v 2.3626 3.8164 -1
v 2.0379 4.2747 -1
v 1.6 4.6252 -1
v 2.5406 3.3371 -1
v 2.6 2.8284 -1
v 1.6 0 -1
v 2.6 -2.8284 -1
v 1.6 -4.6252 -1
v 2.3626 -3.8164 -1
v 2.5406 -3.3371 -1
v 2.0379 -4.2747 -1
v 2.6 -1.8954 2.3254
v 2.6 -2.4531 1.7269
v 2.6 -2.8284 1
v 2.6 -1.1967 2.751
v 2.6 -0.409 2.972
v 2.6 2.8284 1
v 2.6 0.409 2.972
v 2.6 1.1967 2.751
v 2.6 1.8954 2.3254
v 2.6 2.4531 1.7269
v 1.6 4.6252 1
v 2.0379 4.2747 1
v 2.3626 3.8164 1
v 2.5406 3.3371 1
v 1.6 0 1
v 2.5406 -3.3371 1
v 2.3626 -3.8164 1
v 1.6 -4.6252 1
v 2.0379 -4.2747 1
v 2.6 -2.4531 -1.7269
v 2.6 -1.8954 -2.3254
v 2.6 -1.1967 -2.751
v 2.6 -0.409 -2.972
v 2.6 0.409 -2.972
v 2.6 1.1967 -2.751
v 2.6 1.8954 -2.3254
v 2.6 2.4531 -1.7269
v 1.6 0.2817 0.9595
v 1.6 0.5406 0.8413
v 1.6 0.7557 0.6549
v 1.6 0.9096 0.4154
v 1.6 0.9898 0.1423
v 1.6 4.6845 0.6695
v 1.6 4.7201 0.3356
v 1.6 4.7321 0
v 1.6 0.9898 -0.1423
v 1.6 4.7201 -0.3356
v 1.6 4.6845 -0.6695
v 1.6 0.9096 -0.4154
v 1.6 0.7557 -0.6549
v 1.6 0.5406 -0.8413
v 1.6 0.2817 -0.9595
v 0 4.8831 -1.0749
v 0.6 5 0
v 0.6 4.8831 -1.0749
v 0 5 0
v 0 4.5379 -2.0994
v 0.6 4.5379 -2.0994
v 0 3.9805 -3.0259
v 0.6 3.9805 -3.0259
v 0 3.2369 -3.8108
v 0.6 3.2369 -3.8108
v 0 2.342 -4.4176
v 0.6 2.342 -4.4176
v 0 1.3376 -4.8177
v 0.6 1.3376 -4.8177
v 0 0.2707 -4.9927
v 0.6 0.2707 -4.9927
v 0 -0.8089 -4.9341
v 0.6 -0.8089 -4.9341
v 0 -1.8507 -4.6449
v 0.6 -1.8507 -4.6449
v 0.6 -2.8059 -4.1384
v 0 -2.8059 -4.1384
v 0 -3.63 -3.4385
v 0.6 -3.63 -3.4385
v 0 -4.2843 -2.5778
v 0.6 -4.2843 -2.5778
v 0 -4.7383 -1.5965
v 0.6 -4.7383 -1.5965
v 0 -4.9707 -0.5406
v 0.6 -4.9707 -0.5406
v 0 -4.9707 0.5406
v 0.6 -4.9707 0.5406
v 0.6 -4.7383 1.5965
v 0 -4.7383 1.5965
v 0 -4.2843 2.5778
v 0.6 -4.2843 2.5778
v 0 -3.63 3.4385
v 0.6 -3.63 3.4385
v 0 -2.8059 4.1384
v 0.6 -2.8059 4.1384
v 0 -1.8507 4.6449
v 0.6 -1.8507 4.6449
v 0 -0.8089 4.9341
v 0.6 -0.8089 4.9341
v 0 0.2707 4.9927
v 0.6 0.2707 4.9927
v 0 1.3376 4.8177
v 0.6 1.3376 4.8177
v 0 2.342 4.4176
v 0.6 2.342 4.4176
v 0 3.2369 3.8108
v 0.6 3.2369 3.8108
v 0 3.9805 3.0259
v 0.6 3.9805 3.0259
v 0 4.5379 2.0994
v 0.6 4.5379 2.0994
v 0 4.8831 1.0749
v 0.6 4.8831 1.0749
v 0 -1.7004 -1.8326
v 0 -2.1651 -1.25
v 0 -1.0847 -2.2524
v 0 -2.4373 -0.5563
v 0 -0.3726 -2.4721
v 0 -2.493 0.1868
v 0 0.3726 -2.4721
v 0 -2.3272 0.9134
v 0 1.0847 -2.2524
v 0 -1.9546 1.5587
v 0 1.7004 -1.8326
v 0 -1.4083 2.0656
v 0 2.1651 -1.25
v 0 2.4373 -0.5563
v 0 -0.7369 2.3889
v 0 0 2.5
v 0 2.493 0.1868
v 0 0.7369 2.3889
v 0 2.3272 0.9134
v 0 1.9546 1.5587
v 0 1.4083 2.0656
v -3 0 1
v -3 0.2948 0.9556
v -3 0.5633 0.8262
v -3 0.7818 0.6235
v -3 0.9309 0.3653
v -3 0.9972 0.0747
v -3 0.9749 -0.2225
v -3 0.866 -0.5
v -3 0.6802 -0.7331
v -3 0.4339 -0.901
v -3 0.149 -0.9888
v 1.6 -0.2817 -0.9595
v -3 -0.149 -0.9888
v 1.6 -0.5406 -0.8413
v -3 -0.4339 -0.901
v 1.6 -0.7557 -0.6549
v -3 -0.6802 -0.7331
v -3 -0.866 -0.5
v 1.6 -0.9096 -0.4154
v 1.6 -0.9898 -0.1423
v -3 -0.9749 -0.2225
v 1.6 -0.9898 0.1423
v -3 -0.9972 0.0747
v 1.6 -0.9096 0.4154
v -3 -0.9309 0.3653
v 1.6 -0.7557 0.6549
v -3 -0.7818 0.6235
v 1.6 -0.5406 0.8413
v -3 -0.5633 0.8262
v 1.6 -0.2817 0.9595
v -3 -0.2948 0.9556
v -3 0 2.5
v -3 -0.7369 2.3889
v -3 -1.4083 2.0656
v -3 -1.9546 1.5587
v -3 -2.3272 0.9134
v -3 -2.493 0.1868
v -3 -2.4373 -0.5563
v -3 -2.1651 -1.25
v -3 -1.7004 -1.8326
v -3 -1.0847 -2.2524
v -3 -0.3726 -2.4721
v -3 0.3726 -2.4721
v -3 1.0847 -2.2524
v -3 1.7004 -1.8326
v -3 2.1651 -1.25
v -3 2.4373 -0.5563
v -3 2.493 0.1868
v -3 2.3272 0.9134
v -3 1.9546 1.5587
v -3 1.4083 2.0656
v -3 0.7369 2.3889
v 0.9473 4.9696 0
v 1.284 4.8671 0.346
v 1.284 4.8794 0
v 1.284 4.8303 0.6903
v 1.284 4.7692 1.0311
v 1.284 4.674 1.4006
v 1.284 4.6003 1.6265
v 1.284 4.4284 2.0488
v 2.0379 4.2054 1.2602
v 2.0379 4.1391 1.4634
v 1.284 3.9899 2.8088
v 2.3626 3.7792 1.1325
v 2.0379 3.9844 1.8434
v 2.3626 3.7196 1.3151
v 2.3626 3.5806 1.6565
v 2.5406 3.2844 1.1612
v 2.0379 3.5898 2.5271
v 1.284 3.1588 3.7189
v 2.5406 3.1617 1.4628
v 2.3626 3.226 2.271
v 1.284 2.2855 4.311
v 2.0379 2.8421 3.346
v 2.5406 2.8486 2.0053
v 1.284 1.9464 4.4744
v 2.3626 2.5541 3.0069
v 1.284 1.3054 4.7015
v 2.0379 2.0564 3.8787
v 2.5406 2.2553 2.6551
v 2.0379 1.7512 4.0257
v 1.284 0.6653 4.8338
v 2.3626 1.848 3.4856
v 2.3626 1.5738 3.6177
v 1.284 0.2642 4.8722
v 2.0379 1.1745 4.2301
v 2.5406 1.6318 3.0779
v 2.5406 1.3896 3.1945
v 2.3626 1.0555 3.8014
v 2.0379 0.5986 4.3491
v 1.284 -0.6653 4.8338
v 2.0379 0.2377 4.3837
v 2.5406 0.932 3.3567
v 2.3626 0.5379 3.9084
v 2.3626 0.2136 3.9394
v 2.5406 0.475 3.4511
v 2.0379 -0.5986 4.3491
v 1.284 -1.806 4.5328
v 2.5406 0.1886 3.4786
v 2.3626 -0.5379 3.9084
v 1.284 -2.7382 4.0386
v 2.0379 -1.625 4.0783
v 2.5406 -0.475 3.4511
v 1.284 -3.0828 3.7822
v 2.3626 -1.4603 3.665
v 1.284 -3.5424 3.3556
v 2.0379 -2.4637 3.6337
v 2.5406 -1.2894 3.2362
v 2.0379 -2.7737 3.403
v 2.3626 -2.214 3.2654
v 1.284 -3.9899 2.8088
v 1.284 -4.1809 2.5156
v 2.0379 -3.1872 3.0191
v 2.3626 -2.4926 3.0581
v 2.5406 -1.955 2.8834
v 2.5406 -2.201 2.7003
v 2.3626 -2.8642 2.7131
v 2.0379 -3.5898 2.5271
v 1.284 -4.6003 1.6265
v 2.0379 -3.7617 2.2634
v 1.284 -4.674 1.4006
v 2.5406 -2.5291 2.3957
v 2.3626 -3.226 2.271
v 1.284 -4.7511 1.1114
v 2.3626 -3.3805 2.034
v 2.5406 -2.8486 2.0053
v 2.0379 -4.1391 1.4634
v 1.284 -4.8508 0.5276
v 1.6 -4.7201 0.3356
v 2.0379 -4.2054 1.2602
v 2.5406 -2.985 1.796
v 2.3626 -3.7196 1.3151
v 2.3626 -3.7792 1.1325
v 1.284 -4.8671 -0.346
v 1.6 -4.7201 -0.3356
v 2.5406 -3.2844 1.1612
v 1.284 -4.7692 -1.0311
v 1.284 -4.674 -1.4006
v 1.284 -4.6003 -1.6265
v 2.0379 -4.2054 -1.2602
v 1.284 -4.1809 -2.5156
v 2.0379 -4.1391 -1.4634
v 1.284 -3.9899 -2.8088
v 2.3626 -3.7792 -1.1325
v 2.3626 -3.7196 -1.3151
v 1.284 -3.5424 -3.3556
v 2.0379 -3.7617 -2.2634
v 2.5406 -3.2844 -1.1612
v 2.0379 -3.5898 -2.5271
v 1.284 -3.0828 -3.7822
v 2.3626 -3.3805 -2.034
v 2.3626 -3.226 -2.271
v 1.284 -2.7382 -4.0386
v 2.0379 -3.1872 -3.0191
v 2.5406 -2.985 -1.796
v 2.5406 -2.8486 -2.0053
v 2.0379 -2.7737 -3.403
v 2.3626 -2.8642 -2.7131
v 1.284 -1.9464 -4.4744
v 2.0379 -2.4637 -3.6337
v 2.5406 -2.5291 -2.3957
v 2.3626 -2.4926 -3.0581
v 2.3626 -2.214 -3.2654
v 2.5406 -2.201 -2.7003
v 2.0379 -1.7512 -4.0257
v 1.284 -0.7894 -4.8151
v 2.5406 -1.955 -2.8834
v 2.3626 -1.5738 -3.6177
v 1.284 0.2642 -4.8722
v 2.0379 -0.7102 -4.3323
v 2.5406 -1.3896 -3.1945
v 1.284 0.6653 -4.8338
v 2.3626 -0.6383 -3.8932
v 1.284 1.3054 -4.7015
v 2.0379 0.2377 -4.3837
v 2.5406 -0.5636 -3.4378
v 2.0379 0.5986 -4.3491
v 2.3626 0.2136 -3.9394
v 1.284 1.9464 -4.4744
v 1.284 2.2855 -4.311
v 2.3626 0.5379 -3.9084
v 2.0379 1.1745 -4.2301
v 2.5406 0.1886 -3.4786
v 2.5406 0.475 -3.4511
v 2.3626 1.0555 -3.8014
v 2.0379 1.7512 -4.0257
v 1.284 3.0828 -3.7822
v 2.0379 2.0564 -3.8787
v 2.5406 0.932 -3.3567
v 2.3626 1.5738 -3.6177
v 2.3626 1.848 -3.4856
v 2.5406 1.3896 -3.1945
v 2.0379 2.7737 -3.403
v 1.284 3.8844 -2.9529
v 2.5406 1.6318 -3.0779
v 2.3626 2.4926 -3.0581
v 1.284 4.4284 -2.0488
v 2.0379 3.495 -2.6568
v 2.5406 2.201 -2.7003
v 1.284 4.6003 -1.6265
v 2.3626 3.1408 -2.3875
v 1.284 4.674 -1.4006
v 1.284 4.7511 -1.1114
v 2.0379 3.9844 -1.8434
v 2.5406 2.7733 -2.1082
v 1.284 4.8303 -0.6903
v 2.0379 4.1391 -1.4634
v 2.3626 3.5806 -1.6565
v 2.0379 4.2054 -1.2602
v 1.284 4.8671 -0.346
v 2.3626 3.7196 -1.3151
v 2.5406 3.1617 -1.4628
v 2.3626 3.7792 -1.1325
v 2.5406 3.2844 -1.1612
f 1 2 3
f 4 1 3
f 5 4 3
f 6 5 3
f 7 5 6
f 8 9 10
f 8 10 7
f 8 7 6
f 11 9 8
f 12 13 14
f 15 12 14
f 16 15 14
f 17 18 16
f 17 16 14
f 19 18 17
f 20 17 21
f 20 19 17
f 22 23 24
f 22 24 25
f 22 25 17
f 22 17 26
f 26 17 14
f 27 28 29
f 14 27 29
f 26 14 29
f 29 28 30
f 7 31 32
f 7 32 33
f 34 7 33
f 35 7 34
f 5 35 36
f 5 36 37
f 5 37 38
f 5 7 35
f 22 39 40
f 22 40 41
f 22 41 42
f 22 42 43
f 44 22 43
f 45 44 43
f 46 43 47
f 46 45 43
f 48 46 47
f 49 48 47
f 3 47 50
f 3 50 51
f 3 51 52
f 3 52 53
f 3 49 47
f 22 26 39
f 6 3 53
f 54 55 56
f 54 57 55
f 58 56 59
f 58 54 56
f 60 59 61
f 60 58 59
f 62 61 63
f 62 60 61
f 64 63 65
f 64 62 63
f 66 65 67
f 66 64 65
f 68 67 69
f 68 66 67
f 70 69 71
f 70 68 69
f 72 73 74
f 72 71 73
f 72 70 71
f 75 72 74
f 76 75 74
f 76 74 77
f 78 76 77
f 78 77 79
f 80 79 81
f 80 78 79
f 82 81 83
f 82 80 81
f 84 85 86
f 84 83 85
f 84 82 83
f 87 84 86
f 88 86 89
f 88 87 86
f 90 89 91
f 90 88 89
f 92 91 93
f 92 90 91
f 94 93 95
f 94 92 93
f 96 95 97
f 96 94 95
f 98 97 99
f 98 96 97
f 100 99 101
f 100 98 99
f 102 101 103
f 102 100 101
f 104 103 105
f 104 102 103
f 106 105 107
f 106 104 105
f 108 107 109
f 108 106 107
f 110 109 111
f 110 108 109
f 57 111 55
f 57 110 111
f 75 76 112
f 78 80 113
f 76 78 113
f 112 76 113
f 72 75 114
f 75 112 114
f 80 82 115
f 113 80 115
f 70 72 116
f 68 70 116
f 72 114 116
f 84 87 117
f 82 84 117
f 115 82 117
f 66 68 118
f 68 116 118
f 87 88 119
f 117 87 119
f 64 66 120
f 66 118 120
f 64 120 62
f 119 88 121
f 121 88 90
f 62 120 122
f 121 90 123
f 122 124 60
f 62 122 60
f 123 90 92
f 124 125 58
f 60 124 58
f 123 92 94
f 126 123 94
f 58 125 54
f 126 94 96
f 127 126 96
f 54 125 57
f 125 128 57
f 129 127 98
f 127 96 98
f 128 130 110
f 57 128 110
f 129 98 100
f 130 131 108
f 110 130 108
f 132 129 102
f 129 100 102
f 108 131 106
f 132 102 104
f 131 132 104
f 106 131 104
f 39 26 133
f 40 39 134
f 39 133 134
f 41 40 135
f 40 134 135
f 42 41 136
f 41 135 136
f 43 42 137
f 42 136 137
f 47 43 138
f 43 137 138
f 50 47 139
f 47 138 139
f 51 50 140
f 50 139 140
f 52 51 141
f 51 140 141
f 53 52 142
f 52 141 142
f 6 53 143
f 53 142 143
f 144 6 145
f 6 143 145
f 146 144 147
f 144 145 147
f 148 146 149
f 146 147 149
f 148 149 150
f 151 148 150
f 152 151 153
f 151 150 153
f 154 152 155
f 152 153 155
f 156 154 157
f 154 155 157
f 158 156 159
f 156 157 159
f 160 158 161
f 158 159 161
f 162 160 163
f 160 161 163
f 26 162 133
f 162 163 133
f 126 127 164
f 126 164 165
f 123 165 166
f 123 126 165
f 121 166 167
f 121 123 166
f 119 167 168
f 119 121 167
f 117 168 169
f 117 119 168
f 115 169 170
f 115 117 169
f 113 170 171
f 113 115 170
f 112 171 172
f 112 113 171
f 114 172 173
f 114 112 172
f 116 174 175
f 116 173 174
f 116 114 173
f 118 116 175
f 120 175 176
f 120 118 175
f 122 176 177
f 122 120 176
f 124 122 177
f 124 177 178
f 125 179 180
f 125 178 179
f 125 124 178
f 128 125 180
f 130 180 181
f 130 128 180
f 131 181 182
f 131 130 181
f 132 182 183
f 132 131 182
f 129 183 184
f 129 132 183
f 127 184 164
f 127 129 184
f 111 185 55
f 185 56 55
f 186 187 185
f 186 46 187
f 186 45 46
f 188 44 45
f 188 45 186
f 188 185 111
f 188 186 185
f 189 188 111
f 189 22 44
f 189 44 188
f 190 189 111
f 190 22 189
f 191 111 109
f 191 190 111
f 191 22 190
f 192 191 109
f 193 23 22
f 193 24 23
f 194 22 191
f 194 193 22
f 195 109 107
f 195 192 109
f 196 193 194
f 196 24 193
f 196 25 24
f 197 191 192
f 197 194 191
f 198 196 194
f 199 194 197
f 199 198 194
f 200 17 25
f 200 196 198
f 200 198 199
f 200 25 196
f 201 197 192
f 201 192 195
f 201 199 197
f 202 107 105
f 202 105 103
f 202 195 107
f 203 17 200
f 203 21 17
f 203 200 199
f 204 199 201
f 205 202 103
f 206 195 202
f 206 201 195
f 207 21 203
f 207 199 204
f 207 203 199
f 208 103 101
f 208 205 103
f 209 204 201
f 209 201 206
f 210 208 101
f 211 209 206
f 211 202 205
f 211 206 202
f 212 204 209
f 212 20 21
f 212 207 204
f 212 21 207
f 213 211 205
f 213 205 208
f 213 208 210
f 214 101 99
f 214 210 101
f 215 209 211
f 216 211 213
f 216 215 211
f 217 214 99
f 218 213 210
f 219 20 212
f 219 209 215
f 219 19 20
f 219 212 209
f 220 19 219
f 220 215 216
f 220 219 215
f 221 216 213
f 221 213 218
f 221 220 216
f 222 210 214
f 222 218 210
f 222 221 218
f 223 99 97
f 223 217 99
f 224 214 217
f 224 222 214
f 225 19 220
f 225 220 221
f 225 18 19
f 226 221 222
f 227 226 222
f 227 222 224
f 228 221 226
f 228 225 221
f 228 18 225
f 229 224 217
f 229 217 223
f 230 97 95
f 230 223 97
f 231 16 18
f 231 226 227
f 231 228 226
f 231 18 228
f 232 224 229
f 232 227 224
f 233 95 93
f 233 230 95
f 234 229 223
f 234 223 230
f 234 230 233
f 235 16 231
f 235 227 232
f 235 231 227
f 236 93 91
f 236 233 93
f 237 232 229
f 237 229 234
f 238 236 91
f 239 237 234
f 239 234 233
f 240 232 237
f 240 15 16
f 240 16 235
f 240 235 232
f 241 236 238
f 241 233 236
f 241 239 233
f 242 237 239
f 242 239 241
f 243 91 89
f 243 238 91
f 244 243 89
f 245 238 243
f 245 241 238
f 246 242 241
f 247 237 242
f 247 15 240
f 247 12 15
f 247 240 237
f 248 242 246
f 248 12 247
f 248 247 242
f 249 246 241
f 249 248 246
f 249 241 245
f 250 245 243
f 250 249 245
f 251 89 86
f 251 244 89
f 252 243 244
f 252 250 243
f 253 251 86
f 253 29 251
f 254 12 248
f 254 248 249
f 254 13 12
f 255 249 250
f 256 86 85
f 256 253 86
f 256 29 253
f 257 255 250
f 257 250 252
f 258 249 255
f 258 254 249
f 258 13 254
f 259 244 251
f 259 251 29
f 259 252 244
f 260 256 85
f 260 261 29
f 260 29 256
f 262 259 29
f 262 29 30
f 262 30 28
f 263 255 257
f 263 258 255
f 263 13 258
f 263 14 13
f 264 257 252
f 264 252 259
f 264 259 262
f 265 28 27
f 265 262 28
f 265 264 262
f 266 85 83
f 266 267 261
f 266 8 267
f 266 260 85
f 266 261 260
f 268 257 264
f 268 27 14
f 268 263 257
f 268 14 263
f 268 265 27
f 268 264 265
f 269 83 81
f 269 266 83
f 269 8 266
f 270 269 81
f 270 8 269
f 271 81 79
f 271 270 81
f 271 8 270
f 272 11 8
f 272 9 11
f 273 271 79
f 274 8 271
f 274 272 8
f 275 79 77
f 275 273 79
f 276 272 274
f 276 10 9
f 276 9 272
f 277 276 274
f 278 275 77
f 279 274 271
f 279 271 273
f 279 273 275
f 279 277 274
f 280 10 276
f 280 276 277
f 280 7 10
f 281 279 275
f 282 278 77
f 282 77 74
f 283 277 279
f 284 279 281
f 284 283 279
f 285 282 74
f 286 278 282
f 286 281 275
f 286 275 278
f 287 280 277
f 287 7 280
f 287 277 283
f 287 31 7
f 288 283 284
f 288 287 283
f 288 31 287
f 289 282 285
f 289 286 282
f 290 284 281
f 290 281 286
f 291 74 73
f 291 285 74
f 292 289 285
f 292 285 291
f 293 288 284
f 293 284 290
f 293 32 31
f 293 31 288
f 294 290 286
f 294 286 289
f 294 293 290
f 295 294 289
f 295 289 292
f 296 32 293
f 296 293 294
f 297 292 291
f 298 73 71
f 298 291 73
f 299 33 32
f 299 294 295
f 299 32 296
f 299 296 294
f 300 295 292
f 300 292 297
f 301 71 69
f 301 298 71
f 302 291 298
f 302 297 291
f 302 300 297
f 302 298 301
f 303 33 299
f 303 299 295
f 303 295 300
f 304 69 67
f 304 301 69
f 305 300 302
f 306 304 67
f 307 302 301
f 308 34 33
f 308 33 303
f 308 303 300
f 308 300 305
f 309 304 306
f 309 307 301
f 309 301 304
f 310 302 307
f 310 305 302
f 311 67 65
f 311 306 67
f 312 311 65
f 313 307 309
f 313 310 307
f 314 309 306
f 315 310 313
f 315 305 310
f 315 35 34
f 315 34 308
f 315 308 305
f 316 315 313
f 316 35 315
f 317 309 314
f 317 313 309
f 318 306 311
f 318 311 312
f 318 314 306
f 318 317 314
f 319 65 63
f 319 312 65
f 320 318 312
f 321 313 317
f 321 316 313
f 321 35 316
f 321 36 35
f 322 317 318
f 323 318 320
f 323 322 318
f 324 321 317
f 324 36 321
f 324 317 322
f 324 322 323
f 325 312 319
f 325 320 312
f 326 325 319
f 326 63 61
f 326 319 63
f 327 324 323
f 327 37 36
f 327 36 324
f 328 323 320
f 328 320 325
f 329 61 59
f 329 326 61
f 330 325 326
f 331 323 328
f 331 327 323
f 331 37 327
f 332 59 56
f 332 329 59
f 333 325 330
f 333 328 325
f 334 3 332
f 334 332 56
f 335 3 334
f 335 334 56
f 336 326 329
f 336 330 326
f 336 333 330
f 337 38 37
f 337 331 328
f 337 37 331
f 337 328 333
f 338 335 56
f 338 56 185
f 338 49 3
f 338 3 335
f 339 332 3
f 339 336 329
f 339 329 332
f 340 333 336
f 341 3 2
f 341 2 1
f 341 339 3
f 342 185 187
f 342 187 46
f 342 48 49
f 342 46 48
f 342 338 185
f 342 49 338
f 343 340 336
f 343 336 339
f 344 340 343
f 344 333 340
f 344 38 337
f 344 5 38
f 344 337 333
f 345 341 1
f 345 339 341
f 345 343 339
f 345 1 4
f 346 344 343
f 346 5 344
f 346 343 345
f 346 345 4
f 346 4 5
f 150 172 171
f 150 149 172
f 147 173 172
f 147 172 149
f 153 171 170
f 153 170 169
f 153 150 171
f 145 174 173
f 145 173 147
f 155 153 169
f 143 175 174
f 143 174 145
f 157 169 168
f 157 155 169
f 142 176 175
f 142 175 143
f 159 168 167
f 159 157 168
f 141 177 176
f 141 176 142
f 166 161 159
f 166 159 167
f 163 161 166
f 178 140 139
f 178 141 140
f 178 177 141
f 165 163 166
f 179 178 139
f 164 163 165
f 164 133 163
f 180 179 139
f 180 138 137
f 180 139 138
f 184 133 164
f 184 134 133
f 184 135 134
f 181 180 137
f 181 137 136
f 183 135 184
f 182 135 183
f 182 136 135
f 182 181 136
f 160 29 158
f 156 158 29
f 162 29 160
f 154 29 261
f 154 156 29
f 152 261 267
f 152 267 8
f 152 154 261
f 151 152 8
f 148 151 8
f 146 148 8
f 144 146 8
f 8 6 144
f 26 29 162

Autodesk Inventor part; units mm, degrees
ref_plane "YZ Plane" through (0, 0, 0) normal (1, 0, 0) x (0, 1, 0)
ref_plane "XZ Plane" through (0, 0, 0) normal (0, 1, 0) x (-1, 0, 0)
ref_plane "XY Plane" through (0, 0, 0) normal (0, 0, 1) x (1, 0, 0)
sketch "Sketch1" plane through (0, 0, 0) normal (1, 0, 0) x (0, 1, 0)
  circle A0 centre (0, 0) radius 5
  dimension "d0" = 5
extrude "Extrusion1" add sketch "Sketch1" along normal blind 2.6
fillet "Fillet1" radius 2 1 edges at (2.6, -5, 0)
sketch "Sketch2" plane through (2.6, 0, 0) normal (1, 0, 0) x (0, 0, -1)
  circle A0 centre (0, 0) radius 3 projected
  circle A1 centre (0, 0) radius 5 projected
  circle A2 centre (0, 0) radius 3 projected
  circle A3 centre (0, 0) radius 5 projected
  line L0 (1, 4.899) -> (1, -4.899)
  line L1 (-1, 4.899) -> (-1, -4.899)
  dimension "d4" = 1
  dimension "d5" = 1
extrude "Extrusion2" cut sketch "Sketch2" against normal blind 1 contours L0 A0 L1 | A0 L1 A1 L0 | L0 A1 L1 A0
sketch "Sketch3" plane through (0, 0, 0) normal (-1, 0, 0) x (0, 0, 1)
  circle A0 centre (0, 0) radius 2.5
  dimension "d8" = 2.5
extrude "Extrusion3" add sketch "Sketch3" along normal blind 3
sketch "Sketch4" plane through (-3, 0, 0) normal (-1, 0, 0) x (0, 0, 1)
  circle A0 centre (0, 0) radius 1
  dimension "d11" = 1
extrude "Extrusion4" cut sketch "Sketch4" against normal through all
properties part number "nutsert"
